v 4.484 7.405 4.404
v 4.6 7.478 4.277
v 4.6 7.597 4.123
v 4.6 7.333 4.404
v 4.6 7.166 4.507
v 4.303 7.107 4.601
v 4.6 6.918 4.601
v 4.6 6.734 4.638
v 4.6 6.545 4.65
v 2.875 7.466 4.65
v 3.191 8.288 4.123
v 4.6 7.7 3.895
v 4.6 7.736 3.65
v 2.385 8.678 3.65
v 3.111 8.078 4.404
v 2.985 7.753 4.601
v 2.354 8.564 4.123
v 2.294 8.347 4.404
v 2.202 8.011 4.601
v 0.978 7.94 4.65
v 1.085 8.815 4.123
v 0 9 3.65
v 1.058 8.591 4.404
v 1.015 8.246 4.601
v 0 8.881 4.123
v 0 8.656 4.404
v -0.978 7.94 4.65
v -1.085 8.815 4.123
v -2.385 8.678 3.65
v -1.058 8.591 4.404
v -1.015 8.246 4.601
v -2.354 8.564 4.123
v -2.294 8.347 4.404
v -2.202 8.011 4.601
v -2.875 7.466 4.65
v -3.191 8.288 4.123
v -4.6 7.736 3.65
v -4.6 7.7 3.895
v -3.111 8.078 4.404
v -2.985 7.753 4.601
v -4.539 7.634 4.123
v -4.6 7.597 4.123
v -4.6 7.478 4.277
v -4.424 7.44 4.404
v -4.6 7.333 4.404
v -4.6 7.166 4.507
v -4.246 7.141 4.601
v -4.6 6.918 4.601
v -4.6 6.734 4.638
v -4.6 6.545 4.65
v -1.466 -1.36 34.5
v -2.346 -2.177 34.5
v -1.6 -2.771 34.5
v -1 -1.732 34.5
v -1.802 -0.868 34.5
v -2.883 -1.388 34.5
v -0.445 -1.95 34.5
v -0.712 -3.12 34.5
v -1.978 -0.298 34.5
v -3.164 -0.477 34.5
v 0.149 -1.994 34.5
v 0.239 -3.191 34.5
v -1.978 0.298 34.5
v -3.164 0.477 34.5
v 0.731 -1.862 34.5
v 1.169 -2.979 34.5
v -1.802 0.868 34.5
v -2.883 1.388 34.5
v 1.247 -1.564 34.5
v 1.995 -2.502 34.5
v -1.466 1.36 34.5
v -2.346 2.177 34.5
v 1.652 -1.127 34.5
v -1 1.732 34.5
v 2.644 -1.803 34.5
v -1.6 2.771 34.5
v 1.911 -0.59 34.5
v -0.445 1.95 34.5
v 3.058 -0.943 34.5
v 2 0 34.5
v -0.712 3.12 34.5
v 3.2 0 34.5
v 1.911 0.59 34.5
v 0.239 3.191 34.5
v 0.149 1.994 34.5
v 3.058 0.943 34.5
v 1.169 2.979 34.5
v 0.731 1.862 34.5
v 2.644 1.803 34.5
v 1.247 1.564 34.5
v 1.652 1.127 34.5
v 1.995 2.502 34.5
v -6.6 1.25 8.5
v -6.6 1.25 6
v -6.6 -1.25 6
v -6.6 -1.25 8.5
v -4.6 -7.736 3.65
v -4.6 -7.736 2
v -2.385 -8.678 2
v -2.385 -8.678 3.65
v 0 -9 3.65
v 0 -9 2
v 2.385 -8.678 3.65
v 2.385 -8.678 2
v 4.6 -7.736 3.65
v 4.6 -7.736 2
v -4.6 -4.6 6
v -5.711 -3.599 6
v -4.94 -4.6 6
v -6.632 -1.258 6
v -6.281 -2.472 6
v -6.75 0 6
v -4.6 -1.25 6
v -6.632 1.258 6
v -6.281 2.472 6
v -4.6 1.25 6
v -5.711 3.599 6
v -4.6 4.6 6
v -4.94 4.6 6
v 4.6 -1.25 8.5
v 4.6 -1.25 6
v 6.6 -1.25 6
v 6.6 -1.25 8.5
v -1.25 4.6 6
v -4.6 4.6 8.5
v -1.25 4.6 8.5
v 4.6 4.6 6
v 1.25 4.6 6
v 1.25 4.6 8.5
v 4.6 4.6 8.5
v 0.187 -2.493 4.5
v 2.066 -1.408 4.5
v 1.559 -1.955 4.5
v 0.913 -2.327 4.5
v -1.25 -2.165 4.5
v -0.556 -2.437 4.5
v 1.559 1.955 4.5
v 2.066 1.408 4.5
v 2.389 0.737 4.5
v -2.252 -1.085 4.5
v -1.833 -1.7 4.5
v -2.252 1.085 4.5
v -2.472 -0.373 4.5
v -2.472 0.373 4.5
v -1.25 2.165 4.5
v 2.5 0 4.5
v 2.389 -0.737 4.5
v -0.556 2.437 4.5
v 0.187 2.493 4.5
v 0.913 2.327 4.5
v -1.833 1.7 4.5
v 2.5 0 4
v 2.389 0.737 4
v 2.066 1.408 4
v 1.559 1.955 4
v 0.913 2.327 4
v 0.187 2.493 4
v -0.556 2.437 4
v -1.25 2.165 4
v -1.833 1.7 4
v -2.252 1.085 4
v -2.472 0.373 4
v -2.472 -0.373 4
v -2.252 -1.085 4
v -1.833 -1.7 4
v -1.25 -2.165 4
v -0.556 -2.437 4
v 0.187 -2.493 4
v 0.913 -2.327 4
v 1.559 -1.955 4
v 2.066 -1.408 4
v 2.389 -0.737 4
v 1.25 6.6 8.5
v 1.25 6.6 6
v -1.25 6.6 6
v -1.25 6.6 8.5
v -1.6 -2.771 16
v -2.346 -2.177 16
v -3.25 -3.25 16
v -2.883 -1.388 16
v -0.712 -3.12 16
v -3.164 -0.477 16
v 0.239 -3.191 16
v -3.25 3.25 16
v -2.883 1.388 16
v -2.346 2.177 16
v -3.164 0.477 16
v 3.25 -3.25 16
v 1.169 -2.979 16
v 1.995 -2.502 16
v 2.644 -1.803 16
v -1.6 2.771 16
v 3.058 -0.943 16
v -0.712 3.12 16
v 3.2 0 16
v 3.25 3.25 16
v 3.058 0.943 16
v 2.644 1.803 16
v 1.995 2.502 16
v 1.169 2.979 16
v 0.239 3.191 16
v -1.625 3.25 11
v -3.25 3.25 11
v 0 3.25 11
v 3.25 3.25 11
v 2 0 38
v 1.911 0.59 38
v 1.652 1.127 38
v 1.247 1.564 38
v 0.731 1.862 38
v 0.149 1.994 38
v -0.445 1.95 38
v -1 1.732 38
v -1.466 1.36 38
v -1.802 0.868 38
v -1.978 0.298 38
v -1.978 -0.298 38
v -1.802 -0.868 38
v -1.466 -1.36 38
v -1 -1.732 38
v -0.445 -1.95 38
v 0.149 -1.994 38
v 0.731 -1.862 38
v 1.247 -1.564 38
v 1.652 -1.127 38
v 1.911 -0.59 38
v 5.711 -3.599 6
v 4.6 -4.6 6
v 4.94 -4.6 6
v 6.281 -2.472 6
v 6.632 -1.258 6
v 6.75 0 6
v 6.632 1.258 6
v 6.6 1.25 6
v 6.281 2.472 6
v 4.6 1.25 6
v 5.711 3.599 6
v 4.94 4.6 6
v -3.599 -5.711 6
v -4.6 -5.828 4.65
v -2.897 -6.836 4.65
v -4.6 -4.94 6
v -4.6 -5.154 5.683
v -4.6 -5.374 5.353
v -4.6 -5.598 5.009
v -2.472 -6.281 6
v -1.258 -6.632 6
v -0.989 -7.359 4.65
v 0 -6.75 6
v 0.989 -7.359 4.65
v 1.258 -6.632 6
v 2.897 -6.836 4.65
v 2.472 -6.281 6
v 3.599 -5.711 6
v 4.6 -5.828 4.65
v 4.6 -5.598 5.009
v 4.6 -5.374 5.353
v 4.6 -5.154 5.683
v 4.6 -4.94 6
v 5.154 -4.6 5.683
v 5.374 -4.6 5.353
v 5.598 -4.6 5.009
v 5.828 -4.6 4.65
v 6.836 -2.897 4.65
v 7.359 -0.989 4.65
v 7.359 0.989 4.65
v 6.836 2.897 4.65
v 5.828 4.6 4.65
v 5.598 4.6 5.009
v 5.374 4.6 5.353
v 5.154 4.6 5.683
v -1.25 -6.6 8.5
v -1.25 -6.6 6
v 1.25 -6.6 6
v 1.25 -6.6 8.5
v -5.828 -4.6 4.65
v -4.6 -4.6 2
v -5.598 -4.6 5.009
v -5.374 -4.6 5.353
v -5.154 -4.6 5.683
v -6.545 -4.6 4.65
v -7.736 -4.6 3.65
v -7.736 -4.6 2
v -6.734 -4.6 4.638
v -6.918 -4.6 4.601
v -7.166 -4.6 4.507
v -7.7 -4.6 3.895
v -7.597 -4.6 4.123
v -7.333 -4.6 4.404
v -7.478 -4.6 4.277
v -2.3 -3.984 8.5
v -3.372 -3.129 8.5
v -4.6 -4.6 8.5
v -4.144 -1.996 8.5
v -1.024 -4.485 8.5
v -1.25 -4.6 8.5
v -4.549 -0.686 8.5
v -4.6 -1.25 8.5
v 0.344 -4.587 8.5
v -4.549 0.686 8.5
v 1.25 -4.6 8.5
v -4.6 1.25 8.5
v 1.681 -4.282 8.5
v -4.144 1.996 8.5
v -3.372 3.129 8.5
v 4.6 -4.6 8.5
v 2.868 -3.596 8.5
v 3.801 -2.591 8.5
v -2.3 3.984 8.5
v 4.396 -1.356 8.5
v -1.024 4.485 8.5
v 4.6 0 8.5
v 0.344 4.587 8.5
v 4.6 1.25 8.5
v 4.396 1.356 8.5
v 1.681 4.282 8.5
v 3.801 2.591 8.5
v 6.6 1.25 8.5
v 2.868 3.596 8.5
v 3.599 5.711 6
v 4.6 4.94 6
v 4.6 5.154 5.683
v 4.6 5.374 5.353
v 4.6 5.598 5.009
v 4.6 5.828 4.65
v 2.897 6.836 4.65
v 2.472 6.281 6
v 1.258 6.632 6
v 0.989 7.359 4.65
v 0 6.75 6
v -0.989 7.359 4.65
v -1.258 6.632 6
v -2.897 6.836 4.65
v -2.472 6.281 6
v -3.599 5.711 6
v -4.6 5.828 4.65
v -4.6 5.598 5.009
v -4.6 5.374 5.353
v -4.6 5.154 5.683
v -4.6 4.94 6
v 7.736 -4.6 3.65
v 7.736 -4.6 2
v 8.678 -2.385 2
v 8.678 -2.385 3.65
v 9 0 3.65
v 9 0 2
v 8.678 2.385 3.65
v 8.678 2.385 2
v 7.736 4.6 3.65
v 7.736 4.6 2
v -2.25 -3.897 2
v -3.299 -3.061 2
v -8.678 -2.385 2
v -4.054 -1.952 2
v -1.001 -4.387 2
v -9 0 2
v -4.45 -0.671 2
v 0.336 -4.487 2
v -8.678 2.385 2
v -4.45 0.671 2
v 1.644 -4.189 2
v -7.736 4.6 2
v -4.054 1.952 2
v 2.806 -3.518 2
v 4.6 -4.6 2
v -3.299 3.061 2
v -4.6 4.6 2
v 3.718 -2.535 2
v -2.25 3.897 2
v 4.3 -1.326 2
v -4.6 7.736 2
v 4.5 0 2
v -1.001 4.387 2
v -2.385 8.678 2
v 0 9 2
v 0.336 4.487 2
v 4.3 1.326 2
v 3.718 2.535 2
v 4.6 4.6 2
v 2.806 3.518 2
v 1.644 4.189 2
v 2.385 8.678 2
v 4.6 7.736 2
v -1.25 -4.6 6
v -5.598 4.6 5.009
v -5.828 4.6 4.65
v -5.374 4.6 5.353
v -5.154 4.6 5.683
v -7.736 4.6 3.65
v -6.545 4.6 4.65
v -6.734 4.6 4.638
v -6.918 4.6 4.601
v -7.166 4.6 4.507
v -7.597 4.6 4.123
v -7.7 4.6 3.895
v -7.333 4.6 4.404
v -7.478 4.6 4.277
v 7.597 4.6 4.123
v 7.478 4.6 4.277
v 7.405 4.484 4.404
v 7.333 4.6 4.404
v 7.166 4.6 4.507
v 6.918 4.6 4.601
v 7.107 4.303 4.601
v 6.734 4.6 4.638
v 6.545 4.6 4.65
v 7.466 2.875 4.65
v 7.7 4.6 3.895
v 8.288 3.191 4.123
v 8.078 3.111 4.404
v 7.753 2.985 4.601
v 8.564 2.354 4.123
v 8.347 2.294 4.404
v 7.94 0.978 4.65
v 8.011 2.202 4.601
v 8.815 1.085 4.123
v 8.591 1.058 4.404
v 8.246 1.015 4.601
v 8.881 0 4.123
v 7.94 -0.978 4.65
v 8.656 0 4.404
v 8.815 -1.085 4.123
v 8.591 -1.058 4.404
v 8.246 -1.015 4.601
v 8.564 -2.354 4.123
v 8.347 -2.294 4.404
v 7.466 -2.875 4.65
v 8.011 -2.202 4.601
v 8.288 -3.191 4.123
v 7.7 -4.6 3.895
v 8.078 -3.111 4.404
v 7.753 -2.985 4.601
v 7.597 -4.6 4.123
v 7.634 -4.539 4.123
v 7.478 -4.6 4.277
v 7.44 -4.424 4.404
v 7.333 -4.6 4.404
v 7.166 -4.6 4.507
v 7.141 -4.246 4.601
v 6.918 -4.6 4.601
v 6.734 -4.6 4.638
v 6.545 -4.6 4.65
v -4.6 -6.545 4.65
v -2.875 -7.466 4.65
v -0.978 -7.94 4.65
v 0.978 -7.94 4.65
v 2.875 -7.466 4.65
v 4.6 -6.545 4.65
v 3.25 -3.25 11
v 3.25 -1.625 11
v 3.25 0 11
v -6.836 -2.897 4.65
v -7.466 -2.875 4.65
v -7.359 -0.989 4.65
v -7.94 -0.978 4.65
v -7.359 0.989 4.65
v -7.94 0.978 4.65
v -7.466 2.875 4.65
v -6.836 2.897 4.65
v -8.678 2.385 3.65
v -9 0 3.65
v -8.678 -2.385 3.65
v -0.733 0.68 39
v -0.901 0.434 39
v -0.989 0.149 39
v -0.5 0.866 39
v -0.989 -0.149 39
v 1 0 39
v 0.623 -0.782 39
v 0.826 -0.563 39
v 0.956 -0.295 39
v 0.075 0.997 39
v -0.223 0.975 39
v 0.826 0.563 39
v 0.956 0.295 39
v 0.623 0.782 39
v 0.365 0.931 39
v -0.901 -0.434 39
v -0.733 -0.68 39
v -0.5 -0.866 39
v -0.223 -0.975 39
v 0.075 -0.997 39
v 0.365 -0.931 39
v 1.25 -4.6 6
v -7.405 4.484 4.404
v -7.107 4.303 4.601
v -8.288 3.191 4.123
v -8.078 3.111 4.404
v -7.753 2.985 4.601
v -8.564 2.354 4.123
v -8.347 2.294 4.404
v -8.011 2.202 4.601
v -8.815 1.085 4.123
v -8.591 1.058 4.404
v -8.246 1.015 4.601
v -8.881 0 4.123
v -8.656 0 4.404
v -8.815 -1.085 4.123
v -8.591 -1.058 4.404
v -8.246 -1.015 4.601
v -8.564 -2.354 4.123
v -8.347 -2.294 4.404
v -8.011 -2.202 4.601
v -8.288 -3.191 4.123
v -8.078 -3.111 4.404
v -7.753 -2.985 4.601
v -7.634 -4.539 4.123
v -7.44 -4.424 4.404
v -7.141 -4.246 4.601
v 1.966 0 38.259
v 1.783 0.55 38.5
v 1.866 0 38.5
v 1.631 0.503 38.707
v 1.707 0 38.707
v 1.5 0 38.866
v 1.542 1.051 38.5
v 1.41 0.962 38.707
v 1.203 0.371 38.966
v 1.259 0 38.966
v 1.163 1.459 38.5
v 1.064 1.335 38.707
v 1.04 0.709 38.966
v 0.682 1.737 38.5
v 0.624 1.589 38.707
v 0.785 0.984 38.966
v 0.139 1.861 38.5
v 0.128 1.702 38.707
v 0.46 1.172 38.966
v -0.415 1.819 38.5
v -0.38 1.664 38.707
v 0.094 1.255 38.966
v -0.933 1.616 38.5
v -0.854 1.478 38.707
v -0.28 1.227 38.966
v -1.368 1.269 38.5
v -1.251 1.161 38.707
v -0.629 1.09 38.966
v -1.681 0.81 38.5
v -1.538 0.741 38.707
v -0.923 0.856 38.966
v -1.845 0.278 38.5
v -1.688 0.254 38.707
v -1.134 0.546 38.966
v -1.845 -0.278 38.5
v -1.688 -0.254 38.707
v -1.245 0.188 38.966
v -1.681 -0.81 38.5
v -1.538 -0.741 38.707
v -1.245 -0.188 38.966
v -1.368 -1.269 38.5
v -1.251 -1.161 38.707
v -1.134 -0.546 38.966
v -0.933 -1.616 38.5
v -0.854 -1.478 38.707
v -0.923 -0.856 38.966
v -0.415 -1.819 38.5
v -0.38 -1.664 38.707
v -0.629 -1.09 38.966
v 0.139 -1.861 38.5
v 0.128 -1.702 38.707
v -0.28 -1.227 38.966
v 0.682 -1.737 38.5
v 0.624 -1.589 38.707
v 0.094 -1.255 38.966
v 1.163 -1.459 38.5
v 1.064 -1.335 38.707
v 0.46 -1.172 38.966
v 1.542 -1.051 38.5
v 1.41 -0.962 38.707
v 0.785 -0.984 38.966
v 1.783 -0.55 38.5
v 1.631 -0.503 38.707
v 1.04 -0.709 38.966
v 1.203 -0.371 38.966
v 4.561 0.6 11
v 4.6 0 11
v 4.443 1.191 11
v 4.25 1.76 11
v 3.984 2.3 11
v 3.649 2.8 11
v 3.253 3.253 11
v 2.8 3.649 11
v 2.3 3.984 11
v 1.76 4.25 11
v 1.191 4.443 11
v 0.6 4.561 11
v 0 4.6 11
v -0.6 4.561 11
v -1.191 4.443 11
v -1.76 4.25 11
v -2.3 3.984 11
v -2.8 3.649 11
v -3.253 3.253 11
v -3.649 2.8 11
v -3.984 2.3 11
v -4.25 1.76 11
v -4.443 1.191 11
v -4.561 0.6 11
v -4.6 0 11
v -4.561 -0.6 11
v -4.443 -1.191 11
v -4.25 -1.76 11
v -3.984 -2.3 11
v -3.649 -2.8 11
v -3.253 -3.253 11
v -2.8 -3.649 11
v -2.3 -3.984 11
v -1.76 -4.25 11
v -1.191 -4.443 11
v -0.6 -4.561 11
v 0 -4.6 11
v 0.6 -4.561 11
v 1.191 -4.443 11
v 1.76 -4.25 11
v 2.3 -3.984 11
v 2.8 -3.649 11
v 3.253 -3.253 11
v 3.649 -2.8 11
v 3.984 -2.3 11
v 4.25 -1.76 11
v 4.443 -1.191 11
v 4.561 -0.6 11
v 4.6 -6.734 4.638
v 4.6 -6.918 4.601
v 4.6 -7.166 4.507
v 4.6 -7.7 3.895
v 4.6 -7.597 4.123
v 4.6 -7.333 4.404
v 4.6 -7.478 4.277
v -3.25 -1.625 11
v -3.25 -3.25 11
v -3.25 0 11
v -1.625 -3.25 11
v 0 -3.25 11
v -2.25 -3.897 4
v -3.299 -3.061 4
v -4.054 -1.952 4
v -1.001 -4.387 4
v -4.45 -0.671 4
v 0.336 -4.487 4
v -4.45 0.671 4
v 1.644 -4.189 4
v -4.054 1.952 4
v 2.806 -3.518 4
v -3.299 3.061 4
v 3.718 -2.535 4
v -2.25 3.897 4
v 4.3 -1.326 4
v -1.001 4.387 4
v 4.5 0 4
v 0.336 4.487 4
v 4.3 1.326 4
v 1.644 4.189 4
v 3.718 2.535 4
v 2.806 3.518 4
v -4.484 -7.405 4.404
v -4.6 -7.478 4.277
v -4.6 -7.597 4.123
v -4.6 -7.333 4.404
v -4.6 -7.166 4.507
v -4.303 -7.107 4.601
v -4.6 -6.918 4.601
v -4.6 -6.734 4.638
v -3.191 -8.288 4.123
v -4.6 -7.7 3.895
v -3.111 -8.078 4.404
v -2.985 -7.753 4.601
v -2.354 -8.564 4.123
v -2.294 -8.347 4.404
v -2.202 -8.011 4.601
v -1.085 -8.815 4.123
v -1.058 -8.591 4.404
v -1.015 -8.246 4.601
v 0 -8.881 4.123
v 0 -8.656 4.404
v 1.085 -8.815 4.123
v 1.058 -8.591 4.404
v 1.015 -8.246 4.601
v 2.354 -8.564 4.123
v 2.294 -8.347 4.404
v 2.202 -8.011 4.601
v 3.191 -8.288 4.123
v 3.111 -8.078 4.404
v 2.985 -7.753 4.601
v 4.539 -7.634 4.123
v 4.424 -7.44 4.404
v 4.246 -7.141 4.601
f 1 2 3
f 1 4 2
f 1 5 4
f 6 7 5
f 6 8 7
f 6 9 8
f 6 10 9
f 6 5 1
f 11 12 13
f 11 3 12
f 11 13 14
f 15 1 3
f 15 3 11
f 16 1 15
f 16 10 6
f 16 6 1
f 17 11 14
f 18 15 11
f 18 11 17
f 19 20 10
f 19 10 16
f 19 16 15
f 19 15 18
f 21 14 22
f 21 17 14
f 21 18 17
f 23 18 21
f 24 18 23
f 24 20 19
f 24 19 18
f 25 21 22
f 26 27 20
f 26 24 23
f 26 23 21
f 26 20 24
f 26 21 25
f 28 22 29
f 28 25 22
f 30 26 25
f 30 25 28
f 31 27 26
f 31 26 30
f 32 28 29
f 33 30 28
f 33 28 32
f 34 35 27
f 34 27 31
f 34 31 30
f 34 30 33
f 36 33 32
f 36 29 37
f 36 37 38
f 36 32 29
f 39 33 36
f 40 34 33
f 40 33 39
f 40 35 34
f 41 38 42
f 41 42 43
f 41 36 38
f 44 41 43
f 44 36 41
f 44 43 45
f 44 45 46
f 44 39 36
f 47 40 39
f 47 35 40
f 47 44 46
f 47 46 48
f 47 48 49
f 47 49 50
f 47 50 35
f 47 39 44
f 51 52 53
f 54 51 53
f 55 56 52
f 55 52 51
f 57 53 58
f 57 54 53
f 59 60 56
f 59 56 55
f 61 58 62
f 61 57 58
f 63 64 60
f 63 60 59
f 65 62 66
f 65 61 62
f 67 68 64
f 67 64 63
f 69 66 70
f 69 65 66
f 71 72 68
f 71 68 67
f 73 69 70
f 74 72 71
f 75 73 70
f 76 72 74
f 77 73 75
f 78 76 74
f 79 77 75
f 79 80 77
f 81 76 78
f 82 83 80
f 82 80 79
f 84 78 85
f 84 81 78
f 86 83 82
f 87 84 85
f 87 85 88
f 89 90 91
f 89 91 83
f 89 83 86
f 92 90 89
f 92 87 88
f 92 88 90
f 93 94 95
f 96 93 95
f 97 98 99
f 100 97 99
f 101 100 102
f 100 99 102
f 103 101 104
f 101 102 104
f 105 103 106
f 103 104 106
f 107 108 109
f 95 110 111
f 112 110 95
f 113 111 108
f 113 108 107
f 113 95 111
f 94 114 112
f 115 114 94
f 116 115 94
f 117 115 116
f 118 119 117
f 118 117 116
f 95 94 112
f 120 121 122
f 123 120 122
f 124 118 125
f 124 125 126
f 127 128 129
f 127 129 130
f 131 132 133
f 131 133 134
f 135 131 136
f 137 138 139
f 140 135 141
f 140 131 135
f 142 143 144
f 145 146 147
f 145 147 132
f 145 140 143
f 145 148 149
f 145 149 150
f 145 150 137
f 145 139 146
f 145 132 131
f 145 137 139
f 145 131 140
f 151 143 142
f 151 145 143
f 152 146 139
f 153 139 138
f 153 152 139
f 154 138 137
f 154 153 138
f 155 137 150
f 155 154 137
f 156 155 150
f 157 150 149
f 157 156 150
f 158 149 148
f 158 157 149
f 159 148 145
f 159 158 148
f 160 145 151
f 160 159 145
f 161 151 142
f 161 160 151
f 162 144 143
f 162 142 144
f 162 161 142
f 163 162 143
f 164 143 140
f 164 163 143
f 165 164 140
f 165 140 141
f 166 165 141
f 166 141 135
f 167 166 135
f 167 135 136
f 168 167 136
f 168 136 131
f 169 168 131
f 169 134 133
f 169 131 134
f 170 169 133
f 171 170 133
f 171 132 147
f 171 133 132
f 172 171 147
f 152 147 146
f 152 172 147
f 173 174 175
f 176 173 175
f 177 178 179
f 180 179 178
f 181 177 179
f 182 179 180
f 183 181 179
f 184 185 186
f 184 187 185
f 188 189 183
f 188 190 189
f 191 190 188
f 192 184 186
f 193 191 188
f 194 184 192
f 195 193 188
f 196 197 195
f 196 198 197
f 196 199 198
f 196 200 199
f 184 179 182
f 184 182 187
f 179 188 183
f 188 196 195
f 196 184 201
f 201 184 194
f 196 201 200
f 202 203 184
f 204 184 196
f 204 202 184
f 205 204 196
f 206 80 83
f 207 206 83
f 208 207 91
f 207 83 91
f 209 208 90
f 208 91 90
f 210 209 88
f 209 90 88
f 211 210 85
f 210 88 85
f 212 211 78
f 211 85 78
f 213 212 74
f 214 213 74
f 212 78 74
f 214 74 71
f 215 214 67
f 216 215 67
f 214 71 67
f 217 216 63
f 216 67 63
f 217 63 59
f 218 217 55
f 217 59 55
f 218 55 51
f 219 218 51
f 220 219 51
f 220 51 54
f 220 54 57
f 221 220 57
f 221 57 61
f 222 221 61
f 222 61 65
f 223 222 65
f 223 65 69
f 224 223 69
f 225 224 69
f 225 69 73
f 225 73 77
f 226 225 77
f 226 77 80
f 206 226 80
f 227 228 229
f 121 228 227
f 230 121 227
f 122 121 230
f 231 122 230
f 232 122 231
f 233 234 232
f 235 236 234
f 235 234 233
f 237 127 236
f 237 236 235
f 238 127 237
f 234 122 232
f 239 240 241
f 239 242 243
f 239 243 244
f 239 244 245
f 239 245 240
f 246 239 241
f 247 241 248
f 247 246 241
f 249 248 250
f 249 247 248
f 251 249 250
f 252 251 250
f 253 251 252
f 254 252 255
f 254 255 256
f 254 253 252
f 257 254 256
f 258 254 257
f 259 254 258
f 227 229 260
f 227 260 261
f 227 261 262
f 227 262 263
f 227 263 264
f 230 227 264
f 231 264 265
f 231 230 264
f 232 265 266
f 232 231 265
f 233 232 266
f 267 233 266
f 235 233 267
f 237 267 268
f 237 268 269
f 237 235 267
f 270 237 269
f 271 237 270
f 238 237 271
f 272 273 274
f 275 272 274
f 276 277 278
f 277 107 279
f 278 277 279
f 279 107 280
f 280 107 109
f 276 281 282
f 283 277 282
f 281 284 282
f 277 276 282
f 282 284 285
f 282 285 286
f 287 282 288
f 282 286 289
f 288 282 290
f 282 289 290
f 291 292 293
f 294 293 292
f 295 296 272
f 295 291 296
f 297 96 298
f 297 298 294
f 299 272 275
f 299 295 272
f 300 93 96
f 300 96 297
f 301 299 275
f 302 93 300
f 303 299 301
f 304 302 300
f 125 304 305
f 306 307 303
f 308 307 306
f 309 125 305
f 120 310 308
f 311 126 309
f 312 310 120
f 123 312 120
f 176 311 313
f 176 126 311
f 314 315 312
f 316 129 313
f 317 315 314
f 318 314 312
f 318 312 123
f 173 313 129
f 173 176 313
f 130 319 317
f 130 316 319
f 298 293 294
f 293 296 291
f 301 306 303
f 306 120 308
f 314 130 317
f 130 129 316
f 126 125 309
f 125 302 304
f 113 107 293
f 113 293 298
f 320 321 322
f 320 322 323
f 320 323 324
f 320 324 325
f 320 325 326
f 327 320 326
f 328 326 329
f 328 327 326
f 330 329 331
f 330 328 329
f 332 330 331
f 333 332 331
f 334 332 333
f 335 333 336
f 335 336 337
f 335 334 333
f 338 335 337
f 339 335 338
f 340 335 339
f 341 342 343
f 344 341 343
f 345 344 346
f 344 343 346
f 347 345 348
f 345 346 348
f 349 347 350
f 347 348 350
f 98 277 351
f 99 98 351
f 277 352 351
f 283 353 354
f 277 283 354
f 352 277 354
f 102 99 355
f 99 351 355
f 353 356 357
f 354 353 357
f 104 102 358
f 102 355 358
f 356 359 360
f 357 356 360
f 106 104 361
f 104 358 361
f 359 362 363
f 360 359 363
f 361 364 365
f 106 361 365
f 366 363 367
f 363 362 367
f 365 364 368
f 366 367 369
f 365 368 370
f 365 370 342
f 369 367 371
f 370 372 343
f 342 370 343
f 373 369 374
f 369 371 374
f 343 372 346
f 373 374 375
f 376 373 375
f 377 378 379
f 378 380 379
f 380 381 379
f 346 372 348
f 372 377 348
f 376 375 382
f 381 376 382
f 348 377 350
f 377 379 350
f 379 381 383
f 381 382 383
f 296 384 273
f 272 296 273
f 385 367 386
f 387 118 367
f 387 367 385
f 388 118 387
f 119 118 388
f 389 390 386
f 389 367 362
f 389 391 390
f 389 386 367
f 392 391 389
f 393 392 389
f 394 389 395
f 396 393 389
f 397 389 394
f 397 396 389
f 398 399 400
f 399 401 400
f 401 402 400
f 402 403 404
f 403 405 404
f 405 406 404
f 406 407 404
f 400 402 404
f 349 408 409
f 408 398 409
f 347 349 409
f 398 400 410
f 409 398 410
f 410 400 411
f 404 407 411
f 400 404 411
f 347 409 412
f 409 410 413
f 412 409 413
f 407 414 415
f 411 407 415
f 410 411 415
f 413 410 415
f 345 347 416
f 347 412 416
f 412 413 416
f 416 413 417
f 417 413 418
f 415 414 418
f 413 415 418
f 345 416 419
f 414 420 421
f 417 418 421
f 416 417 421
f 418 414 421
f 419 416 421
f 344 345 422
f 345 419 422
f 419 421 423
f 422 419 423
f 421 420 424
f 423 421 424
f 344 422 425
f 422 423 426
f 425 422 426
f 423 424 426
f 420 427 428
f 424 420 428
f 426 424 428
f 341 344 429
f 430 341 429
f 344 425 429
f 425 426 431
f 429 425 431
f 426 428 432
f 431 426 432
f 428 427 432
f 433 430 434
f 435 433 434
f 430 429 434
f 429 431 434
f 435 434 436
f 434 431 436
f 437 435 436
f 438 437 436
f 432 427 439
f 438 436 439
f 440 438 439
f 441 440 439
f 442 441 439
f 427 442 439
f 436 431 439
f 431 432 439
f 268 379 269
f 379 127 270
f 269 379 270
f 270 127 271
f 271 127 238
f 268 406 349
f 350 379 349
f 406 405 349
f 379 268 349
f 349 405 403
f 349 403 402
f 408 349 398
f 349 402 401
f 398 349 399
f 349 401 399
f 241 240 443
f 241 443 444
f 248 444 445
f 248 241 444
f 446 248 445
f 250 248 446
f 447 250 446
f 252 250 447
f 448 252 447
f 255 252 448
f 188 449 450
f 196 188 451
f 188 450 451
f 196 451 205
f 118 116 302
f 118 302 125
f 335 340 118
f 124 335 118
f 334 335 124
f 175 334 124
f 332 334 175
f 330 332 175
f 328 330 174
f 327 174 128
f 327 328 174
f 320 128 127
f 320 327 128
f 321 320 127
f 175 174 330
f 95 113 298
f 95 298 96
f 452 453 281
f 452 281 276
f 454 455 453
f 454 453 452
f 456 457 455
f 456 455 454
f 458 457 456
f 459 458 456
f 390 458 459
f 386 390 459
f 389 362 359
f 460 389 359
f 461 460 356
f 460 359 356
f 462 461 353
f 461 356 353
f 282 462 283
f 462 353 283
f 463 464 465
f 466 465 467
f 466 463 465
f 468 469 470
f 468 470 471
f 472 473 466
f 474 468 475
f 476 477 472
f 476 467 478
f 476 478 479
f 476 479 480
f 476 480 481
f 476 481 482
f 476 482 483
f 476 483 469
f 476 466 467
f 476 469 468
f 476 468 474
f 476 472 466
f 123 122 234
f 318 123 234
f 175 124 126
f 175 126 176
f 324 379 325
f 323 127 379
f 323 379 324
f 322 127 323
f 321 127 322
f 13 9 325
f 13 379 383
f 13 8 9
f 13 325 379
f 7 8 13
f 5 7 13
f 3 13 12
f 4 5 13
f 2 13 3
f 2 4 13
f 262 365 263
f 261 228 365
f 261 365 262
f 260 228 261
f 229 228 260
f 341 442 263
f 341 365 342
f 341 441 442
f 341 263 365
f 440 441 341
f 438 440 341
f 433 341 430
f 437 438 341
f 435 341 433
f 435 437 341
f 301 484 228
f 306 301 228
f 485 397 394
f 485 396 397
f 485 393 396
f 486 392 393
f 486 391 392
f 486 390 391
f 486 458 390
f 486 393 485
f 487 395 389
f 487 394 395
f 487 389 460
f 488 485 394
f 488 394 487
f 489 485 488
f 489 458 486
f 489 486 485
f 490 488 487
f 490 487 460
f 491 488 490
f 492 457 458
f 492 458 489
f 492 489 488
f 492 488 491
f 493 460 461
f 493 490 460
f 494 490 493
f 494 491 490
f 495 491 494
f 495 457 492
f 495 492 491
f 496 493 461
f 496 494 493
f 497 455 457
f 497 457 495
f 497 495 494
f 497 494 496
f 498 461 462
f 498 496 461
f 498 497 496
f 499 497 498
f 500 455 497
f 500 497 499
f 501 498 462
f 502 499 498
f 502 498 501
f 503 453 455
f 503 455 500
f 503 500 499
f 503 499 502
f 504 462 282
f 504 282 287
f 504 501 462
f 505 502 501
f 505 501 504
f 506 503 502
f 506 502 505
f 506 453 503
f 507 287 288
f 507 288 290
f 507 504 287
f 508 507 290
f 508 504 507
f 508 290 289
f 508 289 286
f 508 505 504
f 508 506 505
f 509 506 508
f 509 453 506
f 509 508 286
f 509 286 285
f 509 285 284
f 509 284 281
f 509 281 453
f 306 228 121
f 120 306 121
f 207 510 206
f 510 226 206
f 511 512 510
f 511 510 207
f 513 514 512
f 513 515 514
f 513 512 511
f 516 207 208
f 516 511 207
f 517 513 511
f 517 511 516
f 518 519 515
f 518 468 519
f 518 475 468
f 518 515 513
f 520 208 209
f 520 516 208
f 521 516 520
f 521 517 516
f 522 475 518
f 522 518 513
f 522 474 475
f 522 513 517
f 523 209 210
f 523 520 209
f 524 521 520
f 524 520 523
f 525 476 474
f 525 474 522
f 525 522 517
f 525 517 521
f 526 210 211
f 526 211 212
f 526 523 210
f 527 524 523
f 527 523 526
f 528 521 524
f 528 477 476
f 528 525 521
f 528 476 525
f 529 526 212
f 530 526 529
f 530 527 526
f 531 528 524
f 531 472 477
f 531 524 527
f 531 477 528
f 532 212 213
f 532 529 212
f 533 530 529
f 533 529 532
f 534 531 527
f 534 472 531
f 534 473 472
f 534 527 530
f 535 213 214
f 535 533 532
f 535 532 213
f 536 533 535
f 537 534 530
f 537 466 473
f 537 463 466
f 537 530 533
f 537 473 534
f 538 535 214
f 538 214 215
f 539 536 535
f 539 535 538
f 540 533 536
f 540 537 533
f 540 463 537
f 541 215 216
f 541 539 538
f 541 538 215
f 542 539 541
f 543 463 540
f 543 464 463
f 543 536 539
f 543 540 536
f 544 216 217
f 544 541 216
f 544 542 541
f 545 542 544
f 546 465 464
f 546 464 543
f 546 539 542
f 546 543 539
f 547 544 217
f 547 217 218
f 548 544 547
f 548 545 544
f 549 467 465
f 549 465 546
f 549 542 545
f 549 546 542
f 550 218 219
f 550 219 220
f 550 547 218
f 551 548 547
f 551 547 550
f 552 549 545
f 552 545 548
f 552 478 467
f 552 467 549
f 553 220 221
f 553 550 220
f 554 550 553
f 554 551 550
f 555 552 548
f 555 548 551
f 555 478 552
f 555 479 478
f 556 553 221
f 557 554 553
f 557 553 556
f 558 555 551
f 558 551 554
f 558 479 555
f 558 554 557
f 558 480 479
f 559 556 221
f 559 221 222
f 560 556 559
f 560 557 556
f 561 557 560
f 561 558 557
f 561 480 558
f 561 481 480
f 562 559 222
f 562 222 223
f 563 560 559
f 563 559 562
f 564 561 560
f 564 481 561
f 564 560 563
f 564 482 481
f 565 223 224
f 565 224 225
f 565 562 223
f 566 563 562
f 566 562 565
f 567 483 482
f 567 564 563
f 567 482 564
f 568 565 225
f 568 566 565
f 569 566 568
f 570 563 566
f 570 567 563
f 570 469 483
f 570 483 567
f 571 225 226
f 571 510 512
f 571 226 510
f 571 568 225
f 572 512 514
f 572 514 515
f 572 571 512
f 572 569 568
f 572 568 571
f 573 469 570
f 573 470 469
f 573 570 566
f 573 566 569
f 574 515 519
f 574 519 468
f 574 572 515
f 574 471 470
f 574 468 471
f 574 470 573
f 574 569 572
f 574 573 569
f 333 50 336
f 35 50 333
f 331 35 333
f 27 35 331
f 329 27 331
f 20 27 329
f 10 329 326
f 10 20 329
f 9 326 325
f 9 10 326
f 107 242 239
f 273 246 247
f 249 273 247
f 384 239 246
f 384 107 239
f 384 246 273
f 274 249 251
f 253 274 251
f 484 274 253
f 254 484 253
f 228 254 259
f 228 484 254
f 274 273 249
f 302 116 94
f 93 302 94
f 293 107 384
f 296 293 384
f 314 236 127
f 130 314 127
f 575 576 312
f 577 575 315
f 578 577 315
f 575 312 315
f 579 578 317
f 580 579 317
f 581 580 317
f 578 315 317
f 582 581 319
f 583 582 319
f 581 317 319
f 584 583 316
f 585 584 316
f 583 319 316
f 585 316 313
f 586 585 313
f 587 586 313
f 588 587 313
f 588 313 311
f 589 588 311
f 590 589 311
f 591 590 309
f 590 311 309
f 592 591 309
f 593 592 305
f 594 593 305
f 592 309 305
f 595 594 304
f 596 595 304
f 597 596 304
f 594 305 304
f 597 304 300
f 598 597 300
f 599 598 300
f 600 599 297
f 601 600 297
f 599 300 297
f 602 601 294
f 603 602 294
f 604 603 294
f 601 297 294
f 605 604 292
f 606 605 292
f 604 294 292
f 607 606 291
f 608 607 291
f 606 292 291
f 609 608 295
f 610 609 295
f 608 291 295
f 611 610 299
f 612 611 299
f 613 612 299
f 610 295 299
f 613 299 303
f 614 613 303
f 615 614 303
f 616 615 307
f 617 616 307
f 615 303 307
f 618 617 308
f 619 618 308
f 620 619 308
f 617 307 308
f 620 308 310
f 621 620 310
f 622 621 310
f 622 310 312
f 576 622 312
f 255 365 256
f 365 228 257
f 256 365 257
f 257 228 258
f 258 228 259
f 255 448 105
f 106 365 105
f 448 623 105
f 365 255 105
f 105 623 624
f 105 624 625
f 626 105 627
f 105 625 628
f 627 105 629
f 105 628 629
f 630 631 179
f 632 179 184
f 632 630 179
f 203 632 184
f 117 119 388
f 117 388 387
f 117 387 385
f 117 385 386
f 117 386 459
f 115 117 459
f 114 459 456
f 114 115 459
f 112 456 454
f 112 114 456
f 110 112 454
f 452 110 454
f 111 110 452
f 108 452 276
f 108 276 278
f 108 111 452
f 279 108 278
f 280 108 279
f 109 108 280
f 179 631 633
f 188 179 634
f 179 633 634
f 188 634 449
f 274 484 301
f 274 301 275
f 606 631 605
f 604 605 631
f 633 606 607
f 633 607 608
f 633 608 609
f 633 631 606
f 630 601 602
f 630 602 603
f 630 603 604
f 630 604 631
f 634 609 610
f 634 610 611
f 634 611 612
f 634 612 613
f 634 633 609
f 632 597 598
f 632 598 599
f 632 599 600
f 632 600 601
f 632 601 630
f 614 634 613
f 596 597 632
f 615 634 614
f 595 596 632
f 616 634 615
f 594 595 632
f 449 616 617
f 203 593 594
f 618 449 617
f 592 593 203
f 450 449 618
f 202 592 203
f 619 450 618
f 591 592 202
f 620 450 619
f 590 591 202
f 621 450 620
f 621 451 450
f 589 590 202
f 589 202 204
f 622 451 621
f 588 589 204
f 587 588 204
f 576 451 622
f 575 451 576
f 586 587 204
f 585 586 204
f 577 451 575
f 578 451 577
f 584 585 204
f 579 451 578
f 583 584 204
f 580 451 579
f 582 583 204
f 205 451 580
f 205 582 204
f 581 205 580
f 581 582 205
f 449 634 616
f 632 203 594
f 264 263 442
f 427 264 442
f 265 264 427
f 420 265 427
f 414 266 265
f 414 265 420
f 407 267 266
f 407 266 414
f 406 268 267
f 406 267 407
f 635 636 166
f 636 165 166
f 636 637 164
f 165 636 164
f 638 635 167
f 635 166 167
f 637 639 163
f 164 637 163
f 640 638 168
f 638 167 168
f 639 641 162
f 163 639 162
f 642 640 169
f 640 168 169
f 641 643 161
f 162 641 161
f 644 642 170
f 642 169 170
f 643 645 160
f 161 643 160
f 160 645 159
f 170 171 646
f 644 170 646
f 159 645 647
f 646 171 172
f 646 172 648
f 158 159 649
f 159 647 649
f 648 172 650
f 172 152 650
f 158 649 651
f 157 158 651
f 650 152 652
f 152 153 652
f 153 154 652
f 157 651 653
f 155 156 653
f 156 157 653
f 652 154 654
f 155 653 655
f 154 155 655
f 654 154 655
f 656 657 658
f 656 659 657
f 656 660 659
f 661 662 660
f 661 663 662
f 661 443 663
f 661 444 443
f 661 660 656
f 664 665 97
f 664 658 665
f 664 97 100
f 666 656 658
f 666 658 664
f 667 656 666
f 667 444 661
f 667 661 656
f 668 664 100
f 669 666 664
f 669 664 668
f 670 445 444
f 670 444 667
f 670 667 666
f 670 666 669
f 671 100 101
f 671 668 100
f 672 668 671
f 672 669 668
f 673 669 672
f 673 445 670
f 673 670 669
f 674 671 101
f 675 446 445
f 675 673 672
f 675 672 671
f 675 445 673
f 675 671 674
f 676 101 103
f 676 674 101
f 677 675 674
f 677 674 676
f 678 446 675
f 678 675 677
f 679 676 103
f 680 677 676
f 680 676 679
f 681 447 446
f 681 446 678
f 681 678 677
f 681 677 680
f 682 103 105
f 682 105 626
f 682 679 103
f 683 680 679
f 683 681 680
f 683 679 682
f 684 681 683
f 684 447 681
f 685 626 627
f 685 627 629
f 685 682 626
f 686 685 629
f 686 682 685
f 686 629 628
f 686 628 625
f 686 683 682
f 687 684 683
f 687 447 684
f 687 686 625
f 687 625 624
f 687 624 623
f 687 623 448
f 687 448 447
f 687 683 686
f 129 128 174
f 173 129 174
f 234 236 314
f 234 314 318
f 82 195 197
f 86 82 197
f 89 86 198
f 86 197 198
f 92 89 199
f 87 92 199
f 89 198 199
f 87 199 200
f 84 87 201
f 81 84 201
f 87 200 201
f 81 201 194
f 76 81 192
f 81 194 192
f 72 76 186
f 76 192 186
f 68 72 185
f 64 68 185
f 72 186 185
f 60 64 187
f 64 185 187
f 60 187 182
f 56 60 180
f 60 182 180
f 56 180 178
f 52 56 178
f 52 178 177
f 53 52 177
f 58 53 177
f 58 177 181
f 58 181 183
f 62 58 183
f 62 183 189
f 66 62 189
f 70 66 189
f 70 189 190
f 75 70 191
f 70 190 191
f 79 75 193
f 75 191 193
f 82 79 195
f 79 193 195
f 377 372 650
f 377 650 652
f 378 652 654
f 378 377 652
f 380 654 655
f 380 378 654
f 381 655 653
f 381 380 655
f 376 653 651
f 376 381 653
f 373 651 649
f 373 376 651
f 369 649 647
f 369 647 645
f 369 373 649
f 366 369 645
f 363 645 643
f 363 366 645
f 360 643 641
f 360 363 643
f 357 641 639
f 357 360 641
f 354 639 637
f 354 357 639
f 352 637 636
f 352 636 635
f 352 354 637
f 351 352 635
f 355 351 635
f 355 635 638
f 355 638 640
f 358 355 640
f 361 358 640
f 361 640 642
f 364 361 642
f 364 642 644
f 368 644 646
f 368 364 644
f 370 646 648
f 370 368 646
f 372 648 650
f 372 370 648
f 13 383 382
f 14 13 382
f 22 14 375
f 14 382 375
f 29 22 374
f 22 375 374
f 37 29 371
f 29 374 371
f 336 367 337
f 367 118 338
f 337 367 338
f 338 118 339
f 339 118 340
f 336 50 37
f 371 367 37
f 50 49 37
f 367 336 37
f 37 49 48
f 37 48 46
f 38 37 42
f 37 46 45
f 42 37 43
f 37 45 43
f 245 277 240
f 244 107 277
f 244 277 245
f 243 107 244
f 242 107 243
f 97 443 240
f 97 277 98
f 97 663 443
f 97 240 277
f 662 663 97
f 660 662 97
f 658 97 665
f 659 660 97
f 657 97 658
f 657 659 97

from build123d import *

# Parameters (mm, degrees)
BOX001_W          = 2
BOX001_H          = 2.5
BOX001_DEPTH      = 2.5
ARRAY001_COUNT    = 4
CYLINDER003_R     = 4.6
CYLINDER003_DEPTH = 2.5
BOX002_W          = 6.5
BOX002_H          = 6.5
BOX002_DEPTH      = 5
CYLINDER004_R     = 3.2
CYLINDER004_DEPTH = 18.5
CYLINDER001_W     = 9
CYLINDER001_H     = 6
CYLINDER001_ANGLE = 90
ARRAY_COUNT       = 4
CYLINDER006_R     = 4.5
CYLINDER006_DEPTH = 2
CYLINDER007_R     = 2.5
CYLINDER007_DEPTH = 6
CYLINDER_R        = 9
CYLINDER_DEPTH    = 2.65
FILLET_R          = 1
FILLET001_R       = 1
FILLET002_R       = 1
FILLET003_R       = 1
CYLINDER005_R     = 2
CYLINDER005_DEPTH = 5
FILLET004_R       = 1
BOX_W             = 9.2
BOX_H             = 9.2
BOX_DEPTH         = 2.5


with BuildPart() as array001:
    # Box001 → Box001 (new body)
    with BuildSketch(Plane(origin=(4.6, -1.25, 6), x_dir=(1, 0, 0), z_dir=(0, 0, 1))):
        with Locations((1, 1.25)):
            Rectangle(BOX001_W, BOX001_H)
    extrude(amount=BOX001_DEPTH)

    # Array001: Array001 ×4 about axis
    array001_axis = Axis((0, 0, 0), (0, 0, 1))


with BuildPart() as array001_1:
    add(array001.part)
    for i in range(1, ARRAY001_COUNT):
        add(array001.part.rotate(array001_axis, i * 360 / ARRAY001_COUNT))


with BuildPart() as cilindro003:
    # Cylinder003 → Cylinder003 (new body)
    with BuildSketch(Plane.XY.offset(8.5)):
        Circle(CYLINDER003_R)
    extrude(amount=CYLINDER003_DEPTH)


with BuildPart() as cubo002:
    # Box002 → Box002 (new body)
    with BuildSketch(Plane(origin=(-3.25, -3.25, 11), x_dir=(1, 0, 0), z_dir=(0, 0, 1))):
        with Locations((3.25, 3.25)):
            Rectangle(BOX002_W, BOX002_H)
    extrude(amount=BOX002_DEPTH)


with BuildPart() as cilindro004:
    # Cylinder004 → Cylinder004 (new body)
    with BuildSketch(Plane.XY.offset(16)):
        Circle(CYLINDER004_R)
    extrude(amount=CYLINDER004_DEPTH)


with BuildPart() as array:
    # Cylinder001 → Cylinder001 (revolve)
    with BuildSketch(Plane(origin=(4.6, 4.6, 0), x_dir=(1, 0, 0), z_dir=(0, -1, 0))):
        with Locations((4.5, 3)):
            Rectangle(CYLINDER001_W, CYLINDER001_H)
    revolve(axis=Axis((4.6, 4.6, 0), (0, 0, 1)), revolution_arc=CYLINDER001_ANGLE)

    # Array: Array ×4 about axis
    array_axis = Axis((0, 0, 0), (0, 0, 1))


with BuildPart() as array_1:
    add(array.part)
    for i in range(1, ARRAY_COUNT):
        add(array.part.rotate(array_axis, i * 360 / ARRAY_COUNT))


with BuildPart() as cilindro006:
    # Cylinder006 → Cylinder006 (new body)
    with BuildSketch(Plane.XY.offset(2)):
        Circle(CYLINDER006_R)
    extrude(amount=CYLINDER006_DEPTH)


with BuildPart() as cilindro007:
    # Cylinder007 → Cylinder007 (new body)
    with BuildSketch(Plane.XY.offset(4)):
        Circle(CYLINDER007_R)
    extrude(amount=CYLINDER007_DEPTH)


with BuildPart() as cut001:
    # Cylinder → Cylinder (new body)
    with BuildSketch(Plane.XY.offset(2)):
        Circle(CYLINDER_R)
    extrude(amount=CYLINDER_DEPTH)

    # Cut: cut Cilindro007
    add(cilindro007.part, mode=Mode.SUBTRACT)

    # Cut001: cut Cilindro006
    add(cilindro006.part, mode=Mode.SUBTRACT)


with BuildPart() as fillet003:
    # Cone → Cone (revolve)
    with BuildSketch(Plane(origin=(0, 0, 4.5), x_dir=(1, 0, 0), z_dir=(0, -1, 0))):
        Polygon((0, 0), (7.5, 0), (6.75, 1.5), (0, 1.5), align=None)
    revolve(axis=Axis((0, 0, 4.5), (0, 0, 1)))

    # Fusion: union Cut001
    add(cut001.part)

    # Cut002: cut Array
    add(array_1.part, mode=Mode.SUBTRACT)

    # Fillet
    fillet_edges = [fillet003.edges().sort_by_distance(p)[0] for p in [
        (0, 9, 4.65),
    ]]
    fillet(fillet_edges, radius=FILLET_R)

    # Fillet001
    fillet001_edges = [fillet003.edges().sort_by_distance(p)[0] for p in [
        (-9, 0, 4.65),
    ]]
    fillet(fillet001_edges, radius=FILLET001_R)

    # Fillet002
    fillet002_edges = [fillet003.edges().sort_by_distance(p)[0] for p in [
        (0, -9, 4.65),
    ]]
    fillet(fillet002_edges, radius=FILLET002_R)

    # Fillet003
    fillet003_edges = [fillet003.edges().sort_by_distance(p)[0] for p in [
        (8.678153, 2.3853, 4.65),
    ]]
    fillet(fillet003_edges, radius=FILLET003_R)


with BuildPart() as fillet004:
    # Cylinder005 → Cylinder005 (new body)
    with BuildSketch(Plane.XY.offset(34)):
        Circle(CYLINDER005_R)
    extrude(amount=CYLINDER005_DEPTH)

    # Fillet004
    fillet004_edges = [fillet004.edges().sort_by_distance(p)[0] for p in [
        (-2, 0, 39),
    ]]
    fillet(fillet004_edges, radius=FILLET004_R)


with BuildPart() as fusion001:
    # Box → Box (new body)
    with BuildSketch(Plane(origin=(-4.6, -4.6, 6), x_dir=(1, 0, 0), z_dir=(0, 0, 1))):
        with Locations((4.6, 4.6)):
            Rectangle(BOX_W, BOX_H)
    extrude(amount=BOX_DEPTH)

    # Fusion001: union Array001, Cilindro003, Cubo002, Cilindro004, Fillet003, Fillet004
    add(array001_1.part)
    add(cilindro003.part)
    add(cubo002.part)
    add(cilindro004.part)
    add(fillet003.part)
    add(fillet004.part)


solid = fusion001.part
